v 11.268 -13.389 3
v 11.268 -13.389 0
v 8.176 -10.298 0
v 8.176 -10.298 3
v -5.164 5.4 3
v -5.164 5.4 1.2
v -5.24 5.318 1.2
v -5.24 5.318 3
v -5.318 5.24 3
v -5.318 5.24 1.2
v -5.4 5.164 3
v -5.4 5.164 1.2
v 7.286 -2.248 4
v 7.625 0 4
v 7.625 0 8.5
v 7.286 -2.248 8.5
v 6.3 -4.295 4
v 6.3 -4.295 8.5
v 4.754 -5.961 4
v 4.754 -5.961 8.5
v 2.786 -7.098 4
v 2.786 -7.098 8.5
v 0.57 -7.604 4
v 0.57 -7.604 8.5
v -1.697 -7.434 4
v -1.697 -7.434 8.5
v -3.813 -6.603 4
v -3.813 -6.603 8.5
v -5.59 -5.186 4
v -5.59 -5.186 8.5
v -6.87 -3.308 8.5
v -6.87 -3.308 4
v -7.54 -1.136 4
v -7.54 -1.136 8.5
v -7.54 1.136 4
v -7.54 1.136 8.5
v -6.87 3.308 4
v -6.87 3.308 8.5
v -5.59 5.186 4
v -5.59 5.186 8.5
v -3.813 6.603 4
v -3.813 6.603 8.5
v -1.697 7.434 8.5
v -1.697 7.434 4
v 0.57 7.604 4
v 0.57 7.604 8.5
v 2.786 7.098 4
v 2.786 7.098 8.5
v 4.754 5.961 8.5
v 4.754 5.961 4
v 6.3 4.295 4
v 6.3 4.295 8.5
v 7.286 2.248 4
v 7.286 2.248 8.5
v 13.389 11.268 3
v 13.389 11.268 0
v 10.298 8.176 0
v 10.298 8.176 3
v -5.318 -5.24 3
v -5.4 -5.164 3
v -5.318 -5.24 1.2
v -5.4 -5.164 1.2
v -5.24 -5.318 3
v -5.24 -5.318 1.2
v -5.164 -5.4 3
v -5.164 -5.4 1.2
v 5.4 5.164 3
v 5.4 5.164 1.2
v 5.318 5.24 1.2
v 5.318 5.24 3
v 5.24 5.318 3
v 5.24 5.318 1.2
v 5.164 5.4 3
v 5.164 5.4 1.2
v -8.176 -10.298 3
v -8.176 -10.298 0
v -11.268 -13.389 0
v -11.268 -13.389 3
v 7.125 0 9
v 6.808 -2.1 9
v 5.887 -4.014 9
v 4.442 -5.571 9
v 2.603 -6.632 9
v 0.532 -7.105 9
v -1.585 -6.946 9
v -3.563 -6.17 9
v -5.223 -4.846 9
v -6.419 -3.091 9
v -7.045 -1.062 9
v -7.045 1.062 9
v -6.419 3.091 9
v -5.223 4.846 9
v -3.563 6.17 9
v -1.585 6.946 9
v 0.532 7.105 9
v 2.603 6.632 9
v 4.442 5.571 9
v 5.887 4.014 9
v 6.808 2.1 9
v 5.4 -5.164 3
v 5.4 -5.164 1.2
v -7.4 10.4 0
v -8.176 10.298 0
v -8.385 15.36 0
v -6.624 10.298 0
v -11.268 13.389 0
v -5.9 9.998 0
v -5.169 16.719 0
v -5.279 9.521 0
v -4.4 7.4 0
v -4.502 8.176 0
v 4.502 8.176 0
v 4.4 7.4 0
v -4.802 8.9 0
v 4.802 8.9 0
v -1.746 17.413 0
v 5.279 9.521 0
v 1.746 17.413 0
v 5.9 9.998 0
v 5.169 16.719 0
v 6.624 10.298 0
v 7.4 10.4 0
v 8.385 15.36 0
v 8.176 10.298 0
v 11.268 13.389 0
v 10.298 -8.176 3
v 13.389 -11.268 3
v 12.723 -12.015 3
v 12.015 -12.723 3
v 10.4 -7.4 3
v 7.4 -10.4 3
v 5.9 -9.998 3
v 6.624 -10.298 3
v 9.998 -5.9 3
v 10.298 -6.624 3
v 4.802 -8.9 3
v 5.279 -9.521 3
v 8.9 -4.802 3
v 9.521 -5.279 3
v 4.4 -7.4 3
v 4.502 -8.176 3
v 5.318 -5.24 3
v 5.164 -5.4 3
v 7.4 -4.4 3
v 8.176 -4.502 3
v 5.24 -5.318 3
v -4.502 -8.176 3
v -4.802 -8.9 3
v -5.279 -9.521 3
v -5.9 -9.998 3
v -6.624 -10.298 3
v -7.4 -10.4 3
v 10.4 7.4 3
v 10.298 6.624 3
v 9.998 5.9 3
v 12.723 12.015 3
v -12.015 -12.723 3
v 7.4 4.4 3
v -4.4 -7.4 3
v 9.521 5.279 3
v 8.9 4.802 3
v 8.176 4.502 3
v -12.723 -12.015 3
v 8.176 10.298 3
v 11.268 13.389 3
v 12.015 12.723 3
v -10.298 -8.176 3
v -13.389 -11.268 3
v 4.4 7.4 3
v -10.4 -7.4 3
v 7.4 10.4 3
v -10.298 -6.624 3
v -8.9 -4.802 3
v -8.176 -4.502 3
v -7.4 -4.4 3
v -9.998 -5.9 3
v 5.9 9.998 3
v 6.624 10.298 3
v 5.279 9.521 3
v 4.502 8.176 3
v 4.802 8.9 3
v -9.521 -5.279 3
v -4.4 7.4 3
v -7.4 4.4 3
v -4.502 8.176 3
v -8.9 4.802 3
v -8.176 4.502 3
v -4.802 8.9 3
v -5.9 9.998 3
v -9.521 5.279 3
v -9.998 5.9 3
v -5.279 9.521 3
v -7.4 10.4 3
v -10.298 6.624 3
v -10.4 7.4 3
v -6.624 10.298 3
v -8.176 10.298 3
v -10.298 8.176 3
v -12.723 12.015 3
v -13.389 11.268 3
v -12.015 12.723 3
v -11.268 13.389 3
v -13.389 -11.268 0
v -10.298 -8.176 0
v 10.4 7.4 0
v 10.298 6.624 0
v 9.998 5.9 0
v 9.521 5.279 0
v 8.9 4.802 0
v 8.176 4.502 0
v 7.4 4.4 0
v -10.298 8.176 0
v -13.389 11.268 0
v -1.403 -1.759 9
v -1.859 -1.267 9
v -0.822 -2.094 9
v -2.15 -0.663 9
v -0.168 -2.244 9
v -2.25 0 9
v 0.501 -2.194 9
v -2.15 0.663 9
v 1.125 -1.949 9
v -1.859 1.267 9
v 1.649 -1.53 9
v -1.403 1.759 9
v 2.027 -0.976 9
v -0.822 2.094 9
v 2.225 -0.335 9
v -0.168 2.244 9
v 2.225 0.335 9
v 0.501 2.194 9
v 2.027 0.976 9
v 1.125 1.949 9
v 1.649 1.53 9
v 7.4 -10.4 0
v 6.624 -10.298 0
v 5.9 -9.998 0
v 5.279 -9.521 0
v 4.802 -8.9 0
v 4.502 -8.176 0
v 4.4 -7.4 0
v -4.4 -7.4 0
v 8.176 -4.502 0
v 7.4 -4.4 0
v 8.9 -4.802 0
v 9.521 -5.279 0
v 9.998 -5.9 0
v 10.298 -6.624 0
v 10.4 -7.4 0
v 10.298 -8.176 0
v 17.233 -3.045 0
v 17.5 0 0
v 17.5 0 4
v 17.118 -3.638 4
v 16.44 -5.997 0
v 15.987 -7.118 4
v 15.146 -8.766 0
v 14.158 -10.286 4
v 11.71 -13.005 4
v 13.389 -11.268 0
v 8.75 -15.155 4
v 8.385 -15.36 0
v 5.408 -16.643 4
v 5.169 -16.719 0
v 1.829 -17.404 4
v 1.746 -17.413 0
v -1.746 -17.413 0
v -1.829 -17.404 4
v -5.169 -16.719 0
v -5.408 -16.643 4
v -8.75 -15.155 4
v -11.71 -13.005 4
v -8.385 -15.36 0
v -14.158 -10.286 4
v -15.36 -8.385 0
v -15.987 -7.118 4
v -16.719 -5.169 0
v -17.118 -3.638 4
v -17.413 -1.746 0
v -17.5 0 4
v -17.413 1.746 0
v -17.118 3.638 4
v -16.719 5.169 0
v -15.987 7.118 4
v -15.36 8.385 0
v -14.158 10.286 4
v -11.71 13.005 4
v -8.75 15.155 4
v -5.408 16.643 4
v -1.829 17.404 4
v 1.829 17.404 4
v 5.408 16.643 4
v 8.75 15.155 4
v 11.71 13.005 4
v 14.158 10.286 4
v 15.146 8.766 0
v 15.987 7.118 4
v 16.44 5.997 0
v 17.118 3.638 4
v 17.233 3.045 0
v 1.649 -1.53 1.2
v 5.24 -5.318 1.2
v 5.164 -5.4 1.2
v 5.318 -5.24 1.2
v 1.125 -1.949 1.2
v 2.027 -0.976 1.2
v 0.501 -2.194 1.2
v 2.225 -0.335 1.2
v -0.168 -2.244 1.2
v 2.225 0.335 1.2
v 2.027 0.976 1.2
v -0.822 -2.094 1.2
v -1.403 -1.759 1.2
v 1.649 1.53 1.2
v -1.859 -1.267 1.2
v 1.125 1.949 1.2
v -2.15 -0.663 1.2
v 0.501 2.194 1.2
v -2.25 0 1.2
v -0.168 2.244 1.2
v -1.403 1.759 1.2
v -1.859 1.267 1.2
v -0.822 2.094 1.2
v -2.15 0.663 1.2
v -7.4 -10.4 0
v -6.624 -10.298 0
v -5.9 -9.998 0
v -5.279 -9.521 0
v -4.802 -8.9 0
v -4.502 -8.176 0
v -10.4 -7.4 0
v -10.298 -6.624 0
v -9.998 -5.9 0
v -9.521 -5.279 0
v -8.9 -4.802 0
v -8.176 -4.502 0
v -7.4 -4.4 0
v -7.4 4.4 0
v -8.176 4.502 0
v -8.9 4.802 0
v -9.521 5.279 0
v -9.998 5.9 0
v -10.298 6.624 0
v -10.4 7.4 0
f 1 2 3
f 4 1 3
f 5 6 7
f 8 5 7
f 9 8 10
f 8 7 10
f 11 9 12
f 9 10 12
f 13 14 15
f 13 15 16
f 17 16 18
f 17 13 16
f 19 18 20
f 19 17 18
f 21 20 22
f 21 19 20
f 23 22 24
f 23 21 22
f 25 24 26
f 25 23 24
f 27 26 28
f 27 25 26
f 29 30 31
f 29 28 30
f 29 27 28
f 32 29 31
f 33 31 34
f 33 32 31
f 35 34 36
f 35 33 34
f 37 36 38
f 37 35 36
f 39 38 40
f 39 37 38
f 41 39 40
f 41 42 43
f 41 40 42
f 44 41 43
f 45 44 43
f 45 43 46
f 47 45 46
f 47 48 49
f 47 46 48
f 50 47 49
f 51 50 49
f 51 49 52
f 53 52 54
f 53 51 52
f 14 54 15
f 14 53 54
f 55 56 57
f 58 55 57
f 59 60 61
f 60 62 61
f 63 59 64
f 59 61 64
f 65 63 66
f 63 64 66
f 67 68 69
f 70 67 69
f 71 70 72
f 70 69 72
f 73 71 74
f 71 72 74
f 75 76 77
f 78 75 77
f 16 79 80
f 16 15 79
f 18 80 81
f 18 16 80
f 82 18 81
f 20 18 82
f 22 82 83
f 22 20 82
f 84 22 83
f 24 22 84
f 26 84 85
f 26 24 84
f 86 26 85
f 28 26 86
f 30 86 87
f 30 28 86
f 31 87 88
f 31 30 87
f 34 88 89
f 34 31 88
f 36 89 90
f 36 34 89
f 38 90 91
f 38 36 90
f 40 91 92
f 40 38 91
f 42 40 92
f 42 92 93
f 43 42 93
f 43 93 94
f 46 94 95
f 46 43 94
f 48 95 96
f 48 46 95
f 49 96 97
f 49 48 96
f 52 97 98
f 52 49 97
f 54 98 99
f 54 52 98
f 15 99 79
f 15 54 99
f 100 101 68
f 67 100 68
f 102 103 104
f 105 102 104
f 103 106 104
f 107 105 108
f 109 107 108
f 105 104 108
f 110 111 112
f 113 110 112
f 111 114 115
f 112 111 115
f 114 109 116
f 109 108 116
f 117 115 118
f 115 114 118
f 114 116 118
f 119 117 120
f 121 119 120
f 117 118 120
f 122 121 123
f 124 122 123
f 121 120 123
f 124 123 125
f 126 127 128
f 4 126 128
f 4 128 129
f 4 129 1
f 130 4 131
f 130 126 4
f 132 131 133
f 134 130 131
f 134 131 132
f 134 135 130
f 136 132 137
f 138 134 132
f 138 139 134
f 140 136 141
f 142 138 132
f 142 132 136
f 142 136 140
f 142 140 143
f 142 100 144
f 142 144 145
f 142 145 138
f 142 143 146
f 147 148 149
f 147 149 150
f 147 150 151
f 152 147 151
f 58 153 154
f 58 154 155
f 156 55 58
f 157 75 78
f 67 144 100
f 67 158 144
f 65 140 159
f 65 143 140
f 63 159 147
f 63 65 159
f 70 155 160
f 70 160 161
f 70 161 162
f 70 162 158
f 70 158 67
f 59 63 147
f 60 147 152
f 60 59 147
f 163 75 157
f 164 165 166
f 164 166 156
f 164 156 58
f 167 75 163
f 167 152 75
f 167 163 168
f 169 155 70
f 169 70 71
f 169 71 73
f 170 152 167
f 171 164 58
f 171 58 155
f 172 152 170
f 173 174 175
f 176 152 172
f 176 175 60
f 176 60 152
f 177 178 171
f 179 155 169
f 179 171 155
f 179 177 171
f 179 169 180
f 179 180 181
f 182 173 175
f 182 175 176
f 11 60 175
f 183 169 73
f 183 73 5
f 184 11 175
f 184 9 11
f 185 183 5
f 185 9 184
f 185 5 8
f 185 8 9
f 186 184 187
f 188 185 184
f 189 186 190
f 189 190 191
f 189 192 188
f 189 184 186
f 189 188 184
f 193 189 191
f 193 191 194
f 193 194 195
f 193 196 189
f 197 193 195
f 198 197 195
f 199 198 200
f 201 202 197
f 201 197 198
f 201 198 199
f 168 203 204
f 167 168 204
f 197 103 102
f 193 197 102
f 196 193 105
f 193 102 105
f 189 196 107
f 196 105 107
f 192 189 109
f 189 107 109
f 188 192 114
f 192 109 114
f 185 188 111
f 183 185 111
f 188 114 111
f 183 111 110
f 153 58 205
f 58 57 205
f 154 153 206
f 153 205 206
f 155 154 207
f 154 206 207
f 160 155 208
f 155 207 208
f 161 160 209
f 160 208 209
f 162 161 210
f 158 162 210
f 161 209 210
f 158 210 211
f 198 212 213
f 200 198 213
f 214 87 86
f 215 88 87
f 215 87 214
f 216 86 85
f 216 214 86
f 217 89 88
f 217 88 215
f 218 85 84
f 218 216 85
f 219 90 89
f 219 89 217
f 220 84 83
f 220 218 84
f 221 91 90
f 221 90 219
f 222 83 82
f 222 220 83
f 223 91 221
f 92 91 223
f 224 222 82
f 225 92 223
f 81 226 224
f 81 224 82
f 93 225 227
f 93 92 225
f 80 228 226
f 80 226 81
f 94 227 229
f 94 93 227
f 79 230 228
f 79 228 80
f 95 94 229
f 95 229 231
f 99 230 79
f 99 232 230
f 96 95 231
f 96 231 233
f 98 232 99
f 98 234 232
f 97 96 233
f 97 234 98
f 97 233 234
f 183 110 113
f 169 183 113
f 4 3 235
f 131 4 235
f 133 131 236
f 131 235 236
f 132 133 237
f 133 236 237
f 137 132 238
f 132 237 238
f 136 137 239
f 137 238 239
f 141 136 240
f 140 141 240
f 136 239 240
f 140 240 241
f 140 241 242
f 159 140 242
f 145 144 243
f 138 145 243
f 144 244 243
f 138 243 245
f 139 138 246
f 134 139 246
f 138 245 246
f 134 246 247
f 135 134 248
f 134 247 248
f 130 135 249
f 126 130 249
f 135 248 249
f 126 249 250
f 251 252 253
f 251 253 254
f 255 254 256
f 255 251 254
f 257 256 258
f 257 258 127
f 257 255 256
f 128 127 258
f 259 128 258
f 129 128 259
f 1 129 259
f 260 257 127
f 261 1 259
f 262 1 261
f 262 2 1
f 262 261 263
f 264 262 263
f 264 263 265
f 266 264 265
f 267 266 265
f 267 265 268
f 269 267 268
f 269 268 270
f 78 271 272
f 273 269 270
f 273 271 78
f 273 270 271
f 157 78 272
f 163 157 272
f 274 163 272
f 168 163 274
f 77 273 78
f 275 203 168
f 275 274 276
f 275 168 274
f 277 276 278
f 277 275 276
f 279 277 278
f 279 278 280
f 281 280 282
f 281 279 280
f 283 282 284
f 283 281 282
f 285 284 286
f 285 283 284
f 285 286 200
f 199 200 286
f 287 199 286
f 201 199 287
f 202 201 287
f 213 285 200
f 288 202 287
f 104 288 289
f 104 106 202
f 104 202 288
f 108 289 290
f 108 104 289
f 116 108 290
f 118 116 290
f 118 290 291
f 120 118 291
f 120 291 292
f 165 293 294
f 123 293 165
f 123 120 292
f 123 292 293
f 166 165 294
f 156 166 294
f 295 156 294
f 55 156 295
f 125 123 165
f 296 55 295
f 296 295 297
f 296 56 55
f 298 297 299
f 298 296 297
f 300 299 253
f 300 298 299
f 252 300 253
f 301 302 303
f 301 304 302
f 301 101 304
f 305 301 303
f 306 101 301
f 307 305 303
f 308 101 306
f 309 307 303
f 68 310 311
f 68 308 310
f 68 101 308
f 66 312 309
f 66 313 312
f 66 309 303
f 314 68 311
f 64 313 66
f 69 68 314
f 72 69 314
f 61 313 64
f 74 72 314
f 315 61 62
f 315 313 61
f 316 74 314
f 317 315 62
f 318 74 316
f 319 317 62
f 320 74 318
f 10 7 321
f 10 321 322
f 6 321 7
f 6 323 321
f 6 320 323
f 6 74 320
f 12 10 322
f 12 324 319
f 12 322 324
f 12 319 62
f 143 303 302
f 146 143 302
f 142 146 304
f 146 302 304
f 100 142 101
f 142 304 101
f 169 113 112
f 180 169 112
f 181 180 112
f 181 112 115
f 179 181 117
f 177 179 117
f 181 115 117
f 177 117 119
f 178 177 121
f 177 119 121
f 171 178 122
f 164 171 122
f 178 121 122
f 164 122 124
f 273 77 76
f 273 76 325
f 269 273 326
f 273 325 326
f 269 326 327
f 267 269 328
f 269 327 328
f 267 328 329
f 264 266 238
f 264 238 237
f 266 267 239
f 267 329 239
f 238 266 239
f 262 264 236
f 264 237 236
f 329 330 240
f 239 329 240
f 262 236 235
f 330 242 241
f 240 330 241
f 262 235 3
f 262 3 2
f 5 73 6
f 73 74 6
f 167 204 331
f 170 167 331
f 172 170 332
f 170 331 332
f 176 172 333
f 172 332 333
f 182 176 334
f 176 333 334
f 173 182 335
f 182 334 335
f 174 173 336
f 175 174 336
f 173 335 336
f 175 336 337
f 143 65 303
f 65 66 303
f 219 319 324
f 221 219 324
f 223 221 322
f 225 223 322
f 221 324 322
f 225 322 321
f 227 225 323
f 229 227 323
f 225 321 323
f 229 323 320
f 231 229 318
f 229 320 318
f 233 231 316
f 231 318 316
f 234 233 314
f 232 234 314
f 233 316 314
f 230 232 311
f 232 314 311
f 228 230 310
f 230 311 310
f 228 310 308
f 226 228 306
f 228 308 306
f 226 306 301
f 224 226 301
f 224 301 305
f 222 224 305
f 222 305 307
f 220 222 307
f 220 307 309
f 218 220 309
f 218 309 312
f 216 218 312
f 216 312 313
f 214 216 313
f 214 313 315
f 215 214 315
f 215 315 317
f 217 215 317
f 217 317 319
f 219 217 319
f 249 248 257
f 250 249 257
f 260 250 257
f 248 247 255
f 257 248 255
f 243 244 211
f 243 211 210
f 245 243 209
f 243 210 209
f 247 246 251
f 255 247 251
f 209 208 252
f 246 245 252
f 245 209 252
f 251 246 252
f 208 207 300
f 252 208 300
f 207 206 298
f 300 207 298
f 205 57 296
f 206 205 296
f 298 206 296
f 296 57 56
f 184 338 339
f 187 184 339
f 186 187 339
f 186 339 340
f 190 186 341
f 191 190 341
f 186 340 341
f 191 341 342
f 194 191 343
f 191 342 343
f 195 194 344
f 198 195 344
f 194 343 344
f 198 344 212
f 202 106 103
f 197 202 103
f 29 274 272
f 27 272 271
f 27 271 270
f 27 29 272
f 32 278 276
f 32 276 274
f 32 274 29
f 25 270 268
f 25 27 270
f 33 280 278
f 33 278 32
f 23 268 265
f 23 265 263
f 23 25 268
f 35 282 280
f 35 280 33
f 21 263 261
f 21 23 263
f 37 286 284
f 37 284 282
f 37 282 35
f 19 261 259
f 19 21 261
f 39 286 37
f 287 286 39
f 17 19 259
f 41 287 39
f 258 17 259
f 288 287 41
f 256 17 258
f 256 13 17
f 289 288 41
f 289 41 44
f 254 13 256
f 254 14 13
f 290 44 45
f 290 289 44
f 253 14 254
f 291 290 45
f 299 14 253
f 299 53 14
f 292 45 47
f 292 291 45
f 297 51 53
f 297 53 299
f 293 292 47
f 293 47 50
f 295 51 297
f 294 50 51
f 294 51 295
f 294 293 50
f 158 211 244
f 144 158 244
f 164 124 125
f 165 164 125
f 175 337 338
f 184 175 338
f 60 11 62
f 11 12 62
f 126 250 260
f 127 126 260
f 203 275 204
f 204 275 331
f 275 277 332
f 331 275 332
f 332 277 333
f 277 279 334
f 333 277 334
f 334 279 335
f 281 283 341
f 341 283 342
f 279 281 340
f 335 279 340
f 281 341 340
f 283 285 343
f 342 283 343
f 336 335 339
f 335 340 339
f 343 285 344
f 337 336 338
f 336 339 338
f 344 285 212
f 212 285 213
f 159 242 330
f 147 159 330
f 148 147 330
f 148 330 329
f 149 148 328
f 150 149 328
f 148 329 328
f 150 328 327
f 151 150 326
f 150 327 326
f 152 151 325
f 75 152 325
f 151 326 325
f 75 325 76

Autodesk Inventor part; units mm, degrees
ref_plane "XZ Plane" through (0, 0, 0) normal (0, 1, 0) x (-1, 0, 0)
ref_plane "XY Plane" through (0, 0, 0) normal (0, 0, 1) x (1, 0, 0)
sketch "Sketch1" plane through (0, 0, 0) normal (0, 0, 1) x (1, 0, 0)
  circle A0 centre (0, 0) radius 17.5
  dimension "d0" = 35
extrude "Extrusion1" add sketch "Sketch1" along normal blind 4
sketch "Sketch2" plane through (0, 0, 4) normal (0, 0, 1) x (1, 0, 0)
  circle A0 centre (0, 0) radius 7.625
  dimension "d3" = 15.25
extrude "Extrusion2" add sketch "Sketch2" along normal blind 5
chamfer "Chamfer1" distance 0.5 angle 45 1 edges at (-7.625, 0, 9)
sketch "Sketch3" plane through (0, 0, 0) normal (0, 0, -1) x (-1, 0, 0)
  line L0 (-7.4, -7.4) -> (7.4, -7.4)
  line L1 (7.4, -7.4) -> (7.4, 7.4)
  line L2 (7.4, 7.4) -> (-7.4, 7.4)
  line L3 (-7.4, 7.4) -> (-7.4, -7.4)
  line L4 (-7.4, -7.4) -> (7.4, 7.4) construction
  line L5 (7.4, -7.4) -> (-7.4, 7.4) construction
  point P0 (0, 0)
  dimension "d15" = 1.5
  dimension "d9" = 14.8
extrude "Extrusion3" cut sketch "Sketch3" against normal blind 1.2
sketch "Sketch4" plane through (0, 0, 0) normal (0, 0, -1) x (-1, 0, 0)
  line L0 (-7.4, -7.4) -> (-7.4, 7.4) projected
  circle A0 centre (-7.4, 7.4) radius 3
  point P0 (0, 0)
  dimension "d12" = 6
extrude "Extrusion4" cut sketch "Sketch4" against normal blind 3
sketch "Sketch5" plane through (0, 0, 0) normal (0, 0, -1) x (-1, 0, 0)
  circle A0 centre (-7.4, 7.4) radius 3 projected
  line L0 (-7.4, 7.4) -> (-12.3744, 12.3744) construction
  circle A1 centre (0, 0) radius 17.5 projected
  line L1 (-6.3393, 8.4607) -> (-11.3137, 13.435)
  line L2 (-13.435, 11.3137) -> (-8.4607, 6.3393)
  arc A2 (-8.4607, 6.3393) -> (-6.3393, 8.4607) centre (-7.4, 7.4) ccw
  arc A3 (-11.3137, 13.435) -> (-13.435, 11.3137) centre (-12.3744, 12.3744) ccw
  line L3 (0, -24.5) -> (0, 24.5) projected
  point P0 (-9.8872, 9.8872)
  point P1 (-13.3895, 11.2682)
  point P2 (-10.2978, 8.1765)
  point P3 (-8.1765, 10.2978)
  point P4 (-11.2682, 13.3895)
  dimension "d15" = 1.5
  dimension "d16" = 45
extrude "Extrusion5" cut sketch "Sketch5" against normal up to surface (3 mm away) contours A0 L2 A1 L1
pattern_circular "Circular Pattern1" count 4 over 360 about axis through (0, 0, -10) along (0, 0, 1) of "Extrusion4", "Extrusion5"
sketch "Sketch6" plane through (0, 0, 1.2) normal (0, 0, -1) x (-1, 0, 0)
  circle A0 centre (0, 0) radius 2.25
  dimension "d22" = 4.5
extrude "Extrusion6" cut sketch "Sketch6" against normal through all
ref_plane "Work Plane1" through (0, 0, 0) normal (0.7071, 0.7071, 0) x (0, 0, 1)
sketch "Sketch7" plane through (0, 0, 1.2) normal (0, 0, -1) x (-1, 0, 0)
  line L0 (7.4, 5.1639) -> (5.4, 5.1639)
  line L1 (5.4, 5.1639) -> (5.4, -5.1639)
  line L2 (5.4, -5.1639) -> (7.4, -5.1639)
  line L3 (7.4, -5.1639) -> (7.4, 5.1639)
  line L4 (7.4, 4.4) -> (7.4, -4.4) projected
  arc A0 (4.4, 7.4) -> (7.4, 4.4) centre (7.4, 7.4) ccw projected
  arc A1 (7.4, -4.4) -> (4.4, -7.4) centre (7.4, -7.4) ccw projected
  point P0 (0, 0)
  dimension "d26" = 2
extrude "Extrusion7" cut sketch "Sketch7" against normal up to surface (1.8 mm away)
pattern_circular "Circular Pattern2" count 4 over 360 about axis through (0, 0, -10) along (0, 0, 1) of "Extrusion7"
properties part number "chuck_v03_1.5inset" material "Polytetrafluoroethylene"
